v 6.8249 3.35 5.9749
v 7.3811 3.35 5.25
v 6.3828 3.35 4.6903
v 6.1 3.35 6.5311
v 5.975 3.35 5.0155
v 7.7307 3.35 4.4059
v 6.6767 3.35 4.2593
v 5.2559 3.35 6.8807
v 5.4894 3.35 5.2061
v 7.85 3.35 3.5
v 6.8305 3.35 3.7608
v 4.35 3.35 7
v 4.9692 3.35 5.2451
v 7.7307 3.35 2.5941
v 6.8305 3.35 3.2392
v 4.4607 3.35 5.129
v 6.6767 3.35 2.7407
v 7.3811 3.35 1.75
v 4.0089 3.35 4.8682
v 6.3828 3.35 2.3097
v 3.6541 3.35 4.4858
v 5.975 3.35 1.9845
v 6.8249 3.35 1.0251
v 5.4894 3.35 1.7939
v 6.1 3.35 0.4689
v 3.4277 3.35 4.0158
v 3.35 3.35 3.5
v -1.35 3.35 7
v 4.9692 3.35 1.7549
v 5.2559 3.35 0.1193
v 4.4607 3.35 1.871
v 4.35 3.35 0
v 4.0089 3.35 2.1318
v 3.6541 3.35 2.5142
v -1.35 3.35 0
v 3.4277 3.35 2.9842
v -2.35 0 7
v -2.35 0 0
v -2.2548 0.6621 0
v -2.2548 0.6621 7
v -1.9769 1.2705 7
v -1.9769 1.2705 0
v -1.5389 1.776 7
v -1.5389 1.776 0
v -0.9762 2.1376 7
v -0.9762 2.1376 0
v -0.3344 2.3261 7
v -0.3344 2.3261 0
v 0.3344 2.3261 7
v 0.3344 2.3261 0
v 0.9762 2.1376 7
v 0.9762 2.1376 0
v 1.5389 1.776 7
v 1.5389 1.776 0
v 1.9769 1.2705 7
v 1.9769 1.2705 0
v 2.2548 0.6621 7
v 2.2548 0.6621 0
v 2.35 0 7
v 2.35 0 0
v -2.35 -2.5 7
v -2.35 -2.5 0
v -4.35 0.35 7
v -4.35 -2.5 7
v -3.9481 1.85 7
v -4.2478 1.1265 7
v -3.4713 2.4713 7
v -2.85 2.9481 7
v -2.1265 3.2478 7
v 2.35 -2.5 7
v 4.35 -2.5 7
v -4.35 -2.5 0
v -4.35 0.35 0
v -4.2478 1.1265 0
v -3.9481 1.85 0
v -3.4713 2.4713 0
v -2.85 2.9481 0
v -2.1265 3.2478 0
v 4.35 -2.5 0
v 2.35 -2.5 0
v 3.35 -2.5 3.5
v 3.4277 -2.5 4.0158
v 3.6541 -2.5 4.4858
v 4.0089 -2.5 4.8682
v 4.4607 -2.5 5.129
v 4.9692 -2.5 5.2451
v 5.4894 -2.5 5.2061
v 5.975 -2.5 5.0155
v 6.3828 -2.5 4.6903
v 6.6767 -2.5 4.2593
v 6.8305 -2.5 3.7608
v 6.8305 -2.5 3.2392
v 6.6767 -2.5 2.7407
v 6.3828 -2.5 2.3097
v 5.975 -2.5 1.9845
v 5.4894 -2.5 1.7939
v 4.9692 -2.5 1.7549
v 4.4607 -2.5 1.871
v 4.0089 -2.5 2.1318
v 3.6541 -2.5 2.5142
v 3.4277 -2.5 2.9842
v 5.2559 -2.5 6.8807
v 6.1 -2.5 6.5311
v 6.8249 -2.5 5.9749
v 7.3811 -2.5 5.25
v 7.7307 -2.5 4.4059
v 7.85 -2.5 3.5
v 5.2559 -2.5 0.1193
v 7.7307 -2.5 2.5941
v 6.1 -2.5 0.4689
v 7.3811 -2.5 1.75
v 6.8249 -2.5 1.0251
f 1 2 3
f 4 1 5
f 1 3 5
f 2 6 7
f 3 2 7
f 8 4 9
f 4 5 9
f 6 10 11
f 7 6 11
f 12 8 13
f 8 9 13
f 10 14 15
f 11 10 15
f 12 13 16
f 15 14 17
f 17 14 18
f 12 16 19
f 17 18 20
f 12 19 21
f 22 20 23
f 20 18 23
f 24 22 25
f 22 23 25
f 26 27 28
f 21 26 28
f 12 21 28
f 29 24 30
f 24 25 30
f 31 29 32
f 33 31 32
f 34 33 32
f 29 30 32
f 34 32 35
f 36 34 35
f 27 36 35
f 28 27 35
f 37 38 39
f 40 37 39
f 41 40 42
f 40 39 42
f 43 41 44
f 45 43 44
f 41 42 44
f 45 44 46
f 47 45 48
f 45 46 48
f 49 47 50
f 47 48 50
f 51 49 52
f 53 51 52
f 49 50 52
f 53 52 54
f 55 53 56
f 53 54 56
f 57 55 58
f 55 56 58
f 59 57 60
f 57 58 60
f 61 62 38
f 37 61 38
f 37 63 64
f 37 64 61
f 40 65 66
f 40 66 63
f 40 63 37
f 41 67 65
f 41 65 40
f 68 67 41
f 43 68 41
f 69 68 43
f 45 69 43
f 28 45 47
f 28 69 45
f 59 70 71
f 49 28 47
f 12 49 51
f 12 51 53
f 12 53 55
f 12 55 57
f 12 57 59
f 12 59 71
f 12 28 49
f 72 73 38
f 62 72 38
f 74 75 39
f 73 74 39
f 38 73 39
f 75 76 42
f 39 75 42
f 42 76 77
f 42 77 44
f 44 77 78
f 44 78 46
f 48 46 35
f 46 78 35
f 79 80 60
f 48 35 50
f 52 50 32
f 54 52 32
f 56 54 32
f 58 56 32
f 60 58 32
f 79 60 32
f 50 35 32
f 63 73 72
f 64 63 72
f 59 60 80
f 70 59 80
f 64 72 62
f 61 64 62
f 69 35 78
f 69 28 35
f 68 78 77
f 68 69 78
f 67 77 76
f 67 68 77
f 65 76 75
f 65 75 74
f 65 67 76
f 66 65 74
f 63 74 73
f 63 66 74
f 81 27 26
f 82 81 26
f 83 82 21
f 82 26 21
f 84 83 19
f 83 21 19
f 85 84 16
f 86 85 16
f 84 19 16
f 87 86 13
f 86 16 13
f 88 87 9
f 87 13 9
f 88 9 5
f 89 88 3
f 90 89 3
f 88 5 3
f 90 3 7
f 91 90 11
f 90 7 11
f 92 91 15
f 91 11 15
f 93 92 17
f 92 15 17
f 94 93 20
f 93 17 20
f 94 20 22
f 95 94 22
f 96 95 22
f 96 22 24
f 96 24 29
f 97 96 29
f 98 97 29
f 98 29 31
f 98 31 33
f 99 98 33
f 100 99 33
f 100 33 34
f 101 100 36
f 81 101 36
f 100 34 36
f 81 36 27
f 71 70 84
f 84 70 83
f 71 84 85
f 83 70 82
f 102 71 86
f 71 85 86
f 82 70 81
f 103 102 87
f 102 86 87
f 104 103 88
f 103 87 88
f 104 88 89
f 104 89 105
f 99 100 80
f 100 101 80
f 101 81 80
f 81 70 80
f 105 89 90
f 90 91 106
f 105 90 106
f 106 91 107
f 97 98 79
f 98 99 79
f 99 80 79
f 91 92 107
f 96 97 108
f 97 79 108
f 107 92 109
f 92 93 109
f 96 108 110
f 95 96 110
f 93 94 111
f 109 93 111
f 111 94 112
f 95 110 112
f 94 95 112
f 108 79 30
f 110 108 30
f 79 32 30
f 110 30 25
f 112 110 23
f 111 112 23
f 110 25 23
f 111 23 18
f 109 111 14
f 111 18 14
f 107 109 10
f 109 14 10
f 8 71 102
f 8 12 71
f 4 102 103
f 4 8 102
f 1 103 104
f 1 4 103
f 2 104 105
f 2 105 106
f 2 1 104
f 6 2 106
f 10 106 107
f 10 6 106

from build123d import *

# Parameters (mm, degrees)
F1_DEPTH = 7
F2_R     = 1.75
F3_DEPTH = 5.85
F4_R     = 3.49999
F5_R     = 3


# Not quite as in the source:
# - a fillet or chamfer is up to 0.001 mm smaller than in the source, because OpenCascade refuses the exact size


with BuildPart() as f1:
    # F0 (on Top) → F1 (new body)
    with BuildSketch(Plane.XY):
        with BuildLine():
            ThreePointArc((-2.35, 0), (0, 2.35), (2.35, 0))
            Line((2.35, 0), (2.35, -2.5))
            Line((2.35, -2.5), (7.85, -2.5))
            Line((7.85, -2.5), (7.85, 3.35))
            Line((7.85, 3.35), (-4.35, 3.35))
            Line((-4.35, 3.35), (-4.35, -2.5))
            Line((-4.35, -2.5), (-2.35, -2.5))
            Line((-2.35, -2.5), (-2.35, 0))
        make_face()
    extrude(amount=F1_DEPTH)

    # F2 (on face) → F3 (cut, through all)
    with BuildSketch(Plane(origin=(0, 3.35, 0), x_dir=(-1, 0, 0), z_dir=(0, 1, 0))):
        with Locations((-5.1, 3.5)):
            Circle(F2_R)
    extrude(amount=-F3_DEPTH, mode=Mode.SUBTRACT)

    # F4 (radius 3.5 in the source; OpenCascade refuses exactly that, so slightly less here)
    f4_edges = [f1.edges().sort_by_distance(p)[0] for p in [
        (7.85, 0.425, 7),
        (7.85, 0.425, 0),
    ]]
    fillet(f4_edges, radius=F4_R)

    # F5
    f5_edges = [f1.edges().sort_by_distance(p)[0] for p in [
        (-4.35, 3.35, 3.5),
    ]]
    fillet(f5_edges, radius=F5_R)


solid = f1.part
